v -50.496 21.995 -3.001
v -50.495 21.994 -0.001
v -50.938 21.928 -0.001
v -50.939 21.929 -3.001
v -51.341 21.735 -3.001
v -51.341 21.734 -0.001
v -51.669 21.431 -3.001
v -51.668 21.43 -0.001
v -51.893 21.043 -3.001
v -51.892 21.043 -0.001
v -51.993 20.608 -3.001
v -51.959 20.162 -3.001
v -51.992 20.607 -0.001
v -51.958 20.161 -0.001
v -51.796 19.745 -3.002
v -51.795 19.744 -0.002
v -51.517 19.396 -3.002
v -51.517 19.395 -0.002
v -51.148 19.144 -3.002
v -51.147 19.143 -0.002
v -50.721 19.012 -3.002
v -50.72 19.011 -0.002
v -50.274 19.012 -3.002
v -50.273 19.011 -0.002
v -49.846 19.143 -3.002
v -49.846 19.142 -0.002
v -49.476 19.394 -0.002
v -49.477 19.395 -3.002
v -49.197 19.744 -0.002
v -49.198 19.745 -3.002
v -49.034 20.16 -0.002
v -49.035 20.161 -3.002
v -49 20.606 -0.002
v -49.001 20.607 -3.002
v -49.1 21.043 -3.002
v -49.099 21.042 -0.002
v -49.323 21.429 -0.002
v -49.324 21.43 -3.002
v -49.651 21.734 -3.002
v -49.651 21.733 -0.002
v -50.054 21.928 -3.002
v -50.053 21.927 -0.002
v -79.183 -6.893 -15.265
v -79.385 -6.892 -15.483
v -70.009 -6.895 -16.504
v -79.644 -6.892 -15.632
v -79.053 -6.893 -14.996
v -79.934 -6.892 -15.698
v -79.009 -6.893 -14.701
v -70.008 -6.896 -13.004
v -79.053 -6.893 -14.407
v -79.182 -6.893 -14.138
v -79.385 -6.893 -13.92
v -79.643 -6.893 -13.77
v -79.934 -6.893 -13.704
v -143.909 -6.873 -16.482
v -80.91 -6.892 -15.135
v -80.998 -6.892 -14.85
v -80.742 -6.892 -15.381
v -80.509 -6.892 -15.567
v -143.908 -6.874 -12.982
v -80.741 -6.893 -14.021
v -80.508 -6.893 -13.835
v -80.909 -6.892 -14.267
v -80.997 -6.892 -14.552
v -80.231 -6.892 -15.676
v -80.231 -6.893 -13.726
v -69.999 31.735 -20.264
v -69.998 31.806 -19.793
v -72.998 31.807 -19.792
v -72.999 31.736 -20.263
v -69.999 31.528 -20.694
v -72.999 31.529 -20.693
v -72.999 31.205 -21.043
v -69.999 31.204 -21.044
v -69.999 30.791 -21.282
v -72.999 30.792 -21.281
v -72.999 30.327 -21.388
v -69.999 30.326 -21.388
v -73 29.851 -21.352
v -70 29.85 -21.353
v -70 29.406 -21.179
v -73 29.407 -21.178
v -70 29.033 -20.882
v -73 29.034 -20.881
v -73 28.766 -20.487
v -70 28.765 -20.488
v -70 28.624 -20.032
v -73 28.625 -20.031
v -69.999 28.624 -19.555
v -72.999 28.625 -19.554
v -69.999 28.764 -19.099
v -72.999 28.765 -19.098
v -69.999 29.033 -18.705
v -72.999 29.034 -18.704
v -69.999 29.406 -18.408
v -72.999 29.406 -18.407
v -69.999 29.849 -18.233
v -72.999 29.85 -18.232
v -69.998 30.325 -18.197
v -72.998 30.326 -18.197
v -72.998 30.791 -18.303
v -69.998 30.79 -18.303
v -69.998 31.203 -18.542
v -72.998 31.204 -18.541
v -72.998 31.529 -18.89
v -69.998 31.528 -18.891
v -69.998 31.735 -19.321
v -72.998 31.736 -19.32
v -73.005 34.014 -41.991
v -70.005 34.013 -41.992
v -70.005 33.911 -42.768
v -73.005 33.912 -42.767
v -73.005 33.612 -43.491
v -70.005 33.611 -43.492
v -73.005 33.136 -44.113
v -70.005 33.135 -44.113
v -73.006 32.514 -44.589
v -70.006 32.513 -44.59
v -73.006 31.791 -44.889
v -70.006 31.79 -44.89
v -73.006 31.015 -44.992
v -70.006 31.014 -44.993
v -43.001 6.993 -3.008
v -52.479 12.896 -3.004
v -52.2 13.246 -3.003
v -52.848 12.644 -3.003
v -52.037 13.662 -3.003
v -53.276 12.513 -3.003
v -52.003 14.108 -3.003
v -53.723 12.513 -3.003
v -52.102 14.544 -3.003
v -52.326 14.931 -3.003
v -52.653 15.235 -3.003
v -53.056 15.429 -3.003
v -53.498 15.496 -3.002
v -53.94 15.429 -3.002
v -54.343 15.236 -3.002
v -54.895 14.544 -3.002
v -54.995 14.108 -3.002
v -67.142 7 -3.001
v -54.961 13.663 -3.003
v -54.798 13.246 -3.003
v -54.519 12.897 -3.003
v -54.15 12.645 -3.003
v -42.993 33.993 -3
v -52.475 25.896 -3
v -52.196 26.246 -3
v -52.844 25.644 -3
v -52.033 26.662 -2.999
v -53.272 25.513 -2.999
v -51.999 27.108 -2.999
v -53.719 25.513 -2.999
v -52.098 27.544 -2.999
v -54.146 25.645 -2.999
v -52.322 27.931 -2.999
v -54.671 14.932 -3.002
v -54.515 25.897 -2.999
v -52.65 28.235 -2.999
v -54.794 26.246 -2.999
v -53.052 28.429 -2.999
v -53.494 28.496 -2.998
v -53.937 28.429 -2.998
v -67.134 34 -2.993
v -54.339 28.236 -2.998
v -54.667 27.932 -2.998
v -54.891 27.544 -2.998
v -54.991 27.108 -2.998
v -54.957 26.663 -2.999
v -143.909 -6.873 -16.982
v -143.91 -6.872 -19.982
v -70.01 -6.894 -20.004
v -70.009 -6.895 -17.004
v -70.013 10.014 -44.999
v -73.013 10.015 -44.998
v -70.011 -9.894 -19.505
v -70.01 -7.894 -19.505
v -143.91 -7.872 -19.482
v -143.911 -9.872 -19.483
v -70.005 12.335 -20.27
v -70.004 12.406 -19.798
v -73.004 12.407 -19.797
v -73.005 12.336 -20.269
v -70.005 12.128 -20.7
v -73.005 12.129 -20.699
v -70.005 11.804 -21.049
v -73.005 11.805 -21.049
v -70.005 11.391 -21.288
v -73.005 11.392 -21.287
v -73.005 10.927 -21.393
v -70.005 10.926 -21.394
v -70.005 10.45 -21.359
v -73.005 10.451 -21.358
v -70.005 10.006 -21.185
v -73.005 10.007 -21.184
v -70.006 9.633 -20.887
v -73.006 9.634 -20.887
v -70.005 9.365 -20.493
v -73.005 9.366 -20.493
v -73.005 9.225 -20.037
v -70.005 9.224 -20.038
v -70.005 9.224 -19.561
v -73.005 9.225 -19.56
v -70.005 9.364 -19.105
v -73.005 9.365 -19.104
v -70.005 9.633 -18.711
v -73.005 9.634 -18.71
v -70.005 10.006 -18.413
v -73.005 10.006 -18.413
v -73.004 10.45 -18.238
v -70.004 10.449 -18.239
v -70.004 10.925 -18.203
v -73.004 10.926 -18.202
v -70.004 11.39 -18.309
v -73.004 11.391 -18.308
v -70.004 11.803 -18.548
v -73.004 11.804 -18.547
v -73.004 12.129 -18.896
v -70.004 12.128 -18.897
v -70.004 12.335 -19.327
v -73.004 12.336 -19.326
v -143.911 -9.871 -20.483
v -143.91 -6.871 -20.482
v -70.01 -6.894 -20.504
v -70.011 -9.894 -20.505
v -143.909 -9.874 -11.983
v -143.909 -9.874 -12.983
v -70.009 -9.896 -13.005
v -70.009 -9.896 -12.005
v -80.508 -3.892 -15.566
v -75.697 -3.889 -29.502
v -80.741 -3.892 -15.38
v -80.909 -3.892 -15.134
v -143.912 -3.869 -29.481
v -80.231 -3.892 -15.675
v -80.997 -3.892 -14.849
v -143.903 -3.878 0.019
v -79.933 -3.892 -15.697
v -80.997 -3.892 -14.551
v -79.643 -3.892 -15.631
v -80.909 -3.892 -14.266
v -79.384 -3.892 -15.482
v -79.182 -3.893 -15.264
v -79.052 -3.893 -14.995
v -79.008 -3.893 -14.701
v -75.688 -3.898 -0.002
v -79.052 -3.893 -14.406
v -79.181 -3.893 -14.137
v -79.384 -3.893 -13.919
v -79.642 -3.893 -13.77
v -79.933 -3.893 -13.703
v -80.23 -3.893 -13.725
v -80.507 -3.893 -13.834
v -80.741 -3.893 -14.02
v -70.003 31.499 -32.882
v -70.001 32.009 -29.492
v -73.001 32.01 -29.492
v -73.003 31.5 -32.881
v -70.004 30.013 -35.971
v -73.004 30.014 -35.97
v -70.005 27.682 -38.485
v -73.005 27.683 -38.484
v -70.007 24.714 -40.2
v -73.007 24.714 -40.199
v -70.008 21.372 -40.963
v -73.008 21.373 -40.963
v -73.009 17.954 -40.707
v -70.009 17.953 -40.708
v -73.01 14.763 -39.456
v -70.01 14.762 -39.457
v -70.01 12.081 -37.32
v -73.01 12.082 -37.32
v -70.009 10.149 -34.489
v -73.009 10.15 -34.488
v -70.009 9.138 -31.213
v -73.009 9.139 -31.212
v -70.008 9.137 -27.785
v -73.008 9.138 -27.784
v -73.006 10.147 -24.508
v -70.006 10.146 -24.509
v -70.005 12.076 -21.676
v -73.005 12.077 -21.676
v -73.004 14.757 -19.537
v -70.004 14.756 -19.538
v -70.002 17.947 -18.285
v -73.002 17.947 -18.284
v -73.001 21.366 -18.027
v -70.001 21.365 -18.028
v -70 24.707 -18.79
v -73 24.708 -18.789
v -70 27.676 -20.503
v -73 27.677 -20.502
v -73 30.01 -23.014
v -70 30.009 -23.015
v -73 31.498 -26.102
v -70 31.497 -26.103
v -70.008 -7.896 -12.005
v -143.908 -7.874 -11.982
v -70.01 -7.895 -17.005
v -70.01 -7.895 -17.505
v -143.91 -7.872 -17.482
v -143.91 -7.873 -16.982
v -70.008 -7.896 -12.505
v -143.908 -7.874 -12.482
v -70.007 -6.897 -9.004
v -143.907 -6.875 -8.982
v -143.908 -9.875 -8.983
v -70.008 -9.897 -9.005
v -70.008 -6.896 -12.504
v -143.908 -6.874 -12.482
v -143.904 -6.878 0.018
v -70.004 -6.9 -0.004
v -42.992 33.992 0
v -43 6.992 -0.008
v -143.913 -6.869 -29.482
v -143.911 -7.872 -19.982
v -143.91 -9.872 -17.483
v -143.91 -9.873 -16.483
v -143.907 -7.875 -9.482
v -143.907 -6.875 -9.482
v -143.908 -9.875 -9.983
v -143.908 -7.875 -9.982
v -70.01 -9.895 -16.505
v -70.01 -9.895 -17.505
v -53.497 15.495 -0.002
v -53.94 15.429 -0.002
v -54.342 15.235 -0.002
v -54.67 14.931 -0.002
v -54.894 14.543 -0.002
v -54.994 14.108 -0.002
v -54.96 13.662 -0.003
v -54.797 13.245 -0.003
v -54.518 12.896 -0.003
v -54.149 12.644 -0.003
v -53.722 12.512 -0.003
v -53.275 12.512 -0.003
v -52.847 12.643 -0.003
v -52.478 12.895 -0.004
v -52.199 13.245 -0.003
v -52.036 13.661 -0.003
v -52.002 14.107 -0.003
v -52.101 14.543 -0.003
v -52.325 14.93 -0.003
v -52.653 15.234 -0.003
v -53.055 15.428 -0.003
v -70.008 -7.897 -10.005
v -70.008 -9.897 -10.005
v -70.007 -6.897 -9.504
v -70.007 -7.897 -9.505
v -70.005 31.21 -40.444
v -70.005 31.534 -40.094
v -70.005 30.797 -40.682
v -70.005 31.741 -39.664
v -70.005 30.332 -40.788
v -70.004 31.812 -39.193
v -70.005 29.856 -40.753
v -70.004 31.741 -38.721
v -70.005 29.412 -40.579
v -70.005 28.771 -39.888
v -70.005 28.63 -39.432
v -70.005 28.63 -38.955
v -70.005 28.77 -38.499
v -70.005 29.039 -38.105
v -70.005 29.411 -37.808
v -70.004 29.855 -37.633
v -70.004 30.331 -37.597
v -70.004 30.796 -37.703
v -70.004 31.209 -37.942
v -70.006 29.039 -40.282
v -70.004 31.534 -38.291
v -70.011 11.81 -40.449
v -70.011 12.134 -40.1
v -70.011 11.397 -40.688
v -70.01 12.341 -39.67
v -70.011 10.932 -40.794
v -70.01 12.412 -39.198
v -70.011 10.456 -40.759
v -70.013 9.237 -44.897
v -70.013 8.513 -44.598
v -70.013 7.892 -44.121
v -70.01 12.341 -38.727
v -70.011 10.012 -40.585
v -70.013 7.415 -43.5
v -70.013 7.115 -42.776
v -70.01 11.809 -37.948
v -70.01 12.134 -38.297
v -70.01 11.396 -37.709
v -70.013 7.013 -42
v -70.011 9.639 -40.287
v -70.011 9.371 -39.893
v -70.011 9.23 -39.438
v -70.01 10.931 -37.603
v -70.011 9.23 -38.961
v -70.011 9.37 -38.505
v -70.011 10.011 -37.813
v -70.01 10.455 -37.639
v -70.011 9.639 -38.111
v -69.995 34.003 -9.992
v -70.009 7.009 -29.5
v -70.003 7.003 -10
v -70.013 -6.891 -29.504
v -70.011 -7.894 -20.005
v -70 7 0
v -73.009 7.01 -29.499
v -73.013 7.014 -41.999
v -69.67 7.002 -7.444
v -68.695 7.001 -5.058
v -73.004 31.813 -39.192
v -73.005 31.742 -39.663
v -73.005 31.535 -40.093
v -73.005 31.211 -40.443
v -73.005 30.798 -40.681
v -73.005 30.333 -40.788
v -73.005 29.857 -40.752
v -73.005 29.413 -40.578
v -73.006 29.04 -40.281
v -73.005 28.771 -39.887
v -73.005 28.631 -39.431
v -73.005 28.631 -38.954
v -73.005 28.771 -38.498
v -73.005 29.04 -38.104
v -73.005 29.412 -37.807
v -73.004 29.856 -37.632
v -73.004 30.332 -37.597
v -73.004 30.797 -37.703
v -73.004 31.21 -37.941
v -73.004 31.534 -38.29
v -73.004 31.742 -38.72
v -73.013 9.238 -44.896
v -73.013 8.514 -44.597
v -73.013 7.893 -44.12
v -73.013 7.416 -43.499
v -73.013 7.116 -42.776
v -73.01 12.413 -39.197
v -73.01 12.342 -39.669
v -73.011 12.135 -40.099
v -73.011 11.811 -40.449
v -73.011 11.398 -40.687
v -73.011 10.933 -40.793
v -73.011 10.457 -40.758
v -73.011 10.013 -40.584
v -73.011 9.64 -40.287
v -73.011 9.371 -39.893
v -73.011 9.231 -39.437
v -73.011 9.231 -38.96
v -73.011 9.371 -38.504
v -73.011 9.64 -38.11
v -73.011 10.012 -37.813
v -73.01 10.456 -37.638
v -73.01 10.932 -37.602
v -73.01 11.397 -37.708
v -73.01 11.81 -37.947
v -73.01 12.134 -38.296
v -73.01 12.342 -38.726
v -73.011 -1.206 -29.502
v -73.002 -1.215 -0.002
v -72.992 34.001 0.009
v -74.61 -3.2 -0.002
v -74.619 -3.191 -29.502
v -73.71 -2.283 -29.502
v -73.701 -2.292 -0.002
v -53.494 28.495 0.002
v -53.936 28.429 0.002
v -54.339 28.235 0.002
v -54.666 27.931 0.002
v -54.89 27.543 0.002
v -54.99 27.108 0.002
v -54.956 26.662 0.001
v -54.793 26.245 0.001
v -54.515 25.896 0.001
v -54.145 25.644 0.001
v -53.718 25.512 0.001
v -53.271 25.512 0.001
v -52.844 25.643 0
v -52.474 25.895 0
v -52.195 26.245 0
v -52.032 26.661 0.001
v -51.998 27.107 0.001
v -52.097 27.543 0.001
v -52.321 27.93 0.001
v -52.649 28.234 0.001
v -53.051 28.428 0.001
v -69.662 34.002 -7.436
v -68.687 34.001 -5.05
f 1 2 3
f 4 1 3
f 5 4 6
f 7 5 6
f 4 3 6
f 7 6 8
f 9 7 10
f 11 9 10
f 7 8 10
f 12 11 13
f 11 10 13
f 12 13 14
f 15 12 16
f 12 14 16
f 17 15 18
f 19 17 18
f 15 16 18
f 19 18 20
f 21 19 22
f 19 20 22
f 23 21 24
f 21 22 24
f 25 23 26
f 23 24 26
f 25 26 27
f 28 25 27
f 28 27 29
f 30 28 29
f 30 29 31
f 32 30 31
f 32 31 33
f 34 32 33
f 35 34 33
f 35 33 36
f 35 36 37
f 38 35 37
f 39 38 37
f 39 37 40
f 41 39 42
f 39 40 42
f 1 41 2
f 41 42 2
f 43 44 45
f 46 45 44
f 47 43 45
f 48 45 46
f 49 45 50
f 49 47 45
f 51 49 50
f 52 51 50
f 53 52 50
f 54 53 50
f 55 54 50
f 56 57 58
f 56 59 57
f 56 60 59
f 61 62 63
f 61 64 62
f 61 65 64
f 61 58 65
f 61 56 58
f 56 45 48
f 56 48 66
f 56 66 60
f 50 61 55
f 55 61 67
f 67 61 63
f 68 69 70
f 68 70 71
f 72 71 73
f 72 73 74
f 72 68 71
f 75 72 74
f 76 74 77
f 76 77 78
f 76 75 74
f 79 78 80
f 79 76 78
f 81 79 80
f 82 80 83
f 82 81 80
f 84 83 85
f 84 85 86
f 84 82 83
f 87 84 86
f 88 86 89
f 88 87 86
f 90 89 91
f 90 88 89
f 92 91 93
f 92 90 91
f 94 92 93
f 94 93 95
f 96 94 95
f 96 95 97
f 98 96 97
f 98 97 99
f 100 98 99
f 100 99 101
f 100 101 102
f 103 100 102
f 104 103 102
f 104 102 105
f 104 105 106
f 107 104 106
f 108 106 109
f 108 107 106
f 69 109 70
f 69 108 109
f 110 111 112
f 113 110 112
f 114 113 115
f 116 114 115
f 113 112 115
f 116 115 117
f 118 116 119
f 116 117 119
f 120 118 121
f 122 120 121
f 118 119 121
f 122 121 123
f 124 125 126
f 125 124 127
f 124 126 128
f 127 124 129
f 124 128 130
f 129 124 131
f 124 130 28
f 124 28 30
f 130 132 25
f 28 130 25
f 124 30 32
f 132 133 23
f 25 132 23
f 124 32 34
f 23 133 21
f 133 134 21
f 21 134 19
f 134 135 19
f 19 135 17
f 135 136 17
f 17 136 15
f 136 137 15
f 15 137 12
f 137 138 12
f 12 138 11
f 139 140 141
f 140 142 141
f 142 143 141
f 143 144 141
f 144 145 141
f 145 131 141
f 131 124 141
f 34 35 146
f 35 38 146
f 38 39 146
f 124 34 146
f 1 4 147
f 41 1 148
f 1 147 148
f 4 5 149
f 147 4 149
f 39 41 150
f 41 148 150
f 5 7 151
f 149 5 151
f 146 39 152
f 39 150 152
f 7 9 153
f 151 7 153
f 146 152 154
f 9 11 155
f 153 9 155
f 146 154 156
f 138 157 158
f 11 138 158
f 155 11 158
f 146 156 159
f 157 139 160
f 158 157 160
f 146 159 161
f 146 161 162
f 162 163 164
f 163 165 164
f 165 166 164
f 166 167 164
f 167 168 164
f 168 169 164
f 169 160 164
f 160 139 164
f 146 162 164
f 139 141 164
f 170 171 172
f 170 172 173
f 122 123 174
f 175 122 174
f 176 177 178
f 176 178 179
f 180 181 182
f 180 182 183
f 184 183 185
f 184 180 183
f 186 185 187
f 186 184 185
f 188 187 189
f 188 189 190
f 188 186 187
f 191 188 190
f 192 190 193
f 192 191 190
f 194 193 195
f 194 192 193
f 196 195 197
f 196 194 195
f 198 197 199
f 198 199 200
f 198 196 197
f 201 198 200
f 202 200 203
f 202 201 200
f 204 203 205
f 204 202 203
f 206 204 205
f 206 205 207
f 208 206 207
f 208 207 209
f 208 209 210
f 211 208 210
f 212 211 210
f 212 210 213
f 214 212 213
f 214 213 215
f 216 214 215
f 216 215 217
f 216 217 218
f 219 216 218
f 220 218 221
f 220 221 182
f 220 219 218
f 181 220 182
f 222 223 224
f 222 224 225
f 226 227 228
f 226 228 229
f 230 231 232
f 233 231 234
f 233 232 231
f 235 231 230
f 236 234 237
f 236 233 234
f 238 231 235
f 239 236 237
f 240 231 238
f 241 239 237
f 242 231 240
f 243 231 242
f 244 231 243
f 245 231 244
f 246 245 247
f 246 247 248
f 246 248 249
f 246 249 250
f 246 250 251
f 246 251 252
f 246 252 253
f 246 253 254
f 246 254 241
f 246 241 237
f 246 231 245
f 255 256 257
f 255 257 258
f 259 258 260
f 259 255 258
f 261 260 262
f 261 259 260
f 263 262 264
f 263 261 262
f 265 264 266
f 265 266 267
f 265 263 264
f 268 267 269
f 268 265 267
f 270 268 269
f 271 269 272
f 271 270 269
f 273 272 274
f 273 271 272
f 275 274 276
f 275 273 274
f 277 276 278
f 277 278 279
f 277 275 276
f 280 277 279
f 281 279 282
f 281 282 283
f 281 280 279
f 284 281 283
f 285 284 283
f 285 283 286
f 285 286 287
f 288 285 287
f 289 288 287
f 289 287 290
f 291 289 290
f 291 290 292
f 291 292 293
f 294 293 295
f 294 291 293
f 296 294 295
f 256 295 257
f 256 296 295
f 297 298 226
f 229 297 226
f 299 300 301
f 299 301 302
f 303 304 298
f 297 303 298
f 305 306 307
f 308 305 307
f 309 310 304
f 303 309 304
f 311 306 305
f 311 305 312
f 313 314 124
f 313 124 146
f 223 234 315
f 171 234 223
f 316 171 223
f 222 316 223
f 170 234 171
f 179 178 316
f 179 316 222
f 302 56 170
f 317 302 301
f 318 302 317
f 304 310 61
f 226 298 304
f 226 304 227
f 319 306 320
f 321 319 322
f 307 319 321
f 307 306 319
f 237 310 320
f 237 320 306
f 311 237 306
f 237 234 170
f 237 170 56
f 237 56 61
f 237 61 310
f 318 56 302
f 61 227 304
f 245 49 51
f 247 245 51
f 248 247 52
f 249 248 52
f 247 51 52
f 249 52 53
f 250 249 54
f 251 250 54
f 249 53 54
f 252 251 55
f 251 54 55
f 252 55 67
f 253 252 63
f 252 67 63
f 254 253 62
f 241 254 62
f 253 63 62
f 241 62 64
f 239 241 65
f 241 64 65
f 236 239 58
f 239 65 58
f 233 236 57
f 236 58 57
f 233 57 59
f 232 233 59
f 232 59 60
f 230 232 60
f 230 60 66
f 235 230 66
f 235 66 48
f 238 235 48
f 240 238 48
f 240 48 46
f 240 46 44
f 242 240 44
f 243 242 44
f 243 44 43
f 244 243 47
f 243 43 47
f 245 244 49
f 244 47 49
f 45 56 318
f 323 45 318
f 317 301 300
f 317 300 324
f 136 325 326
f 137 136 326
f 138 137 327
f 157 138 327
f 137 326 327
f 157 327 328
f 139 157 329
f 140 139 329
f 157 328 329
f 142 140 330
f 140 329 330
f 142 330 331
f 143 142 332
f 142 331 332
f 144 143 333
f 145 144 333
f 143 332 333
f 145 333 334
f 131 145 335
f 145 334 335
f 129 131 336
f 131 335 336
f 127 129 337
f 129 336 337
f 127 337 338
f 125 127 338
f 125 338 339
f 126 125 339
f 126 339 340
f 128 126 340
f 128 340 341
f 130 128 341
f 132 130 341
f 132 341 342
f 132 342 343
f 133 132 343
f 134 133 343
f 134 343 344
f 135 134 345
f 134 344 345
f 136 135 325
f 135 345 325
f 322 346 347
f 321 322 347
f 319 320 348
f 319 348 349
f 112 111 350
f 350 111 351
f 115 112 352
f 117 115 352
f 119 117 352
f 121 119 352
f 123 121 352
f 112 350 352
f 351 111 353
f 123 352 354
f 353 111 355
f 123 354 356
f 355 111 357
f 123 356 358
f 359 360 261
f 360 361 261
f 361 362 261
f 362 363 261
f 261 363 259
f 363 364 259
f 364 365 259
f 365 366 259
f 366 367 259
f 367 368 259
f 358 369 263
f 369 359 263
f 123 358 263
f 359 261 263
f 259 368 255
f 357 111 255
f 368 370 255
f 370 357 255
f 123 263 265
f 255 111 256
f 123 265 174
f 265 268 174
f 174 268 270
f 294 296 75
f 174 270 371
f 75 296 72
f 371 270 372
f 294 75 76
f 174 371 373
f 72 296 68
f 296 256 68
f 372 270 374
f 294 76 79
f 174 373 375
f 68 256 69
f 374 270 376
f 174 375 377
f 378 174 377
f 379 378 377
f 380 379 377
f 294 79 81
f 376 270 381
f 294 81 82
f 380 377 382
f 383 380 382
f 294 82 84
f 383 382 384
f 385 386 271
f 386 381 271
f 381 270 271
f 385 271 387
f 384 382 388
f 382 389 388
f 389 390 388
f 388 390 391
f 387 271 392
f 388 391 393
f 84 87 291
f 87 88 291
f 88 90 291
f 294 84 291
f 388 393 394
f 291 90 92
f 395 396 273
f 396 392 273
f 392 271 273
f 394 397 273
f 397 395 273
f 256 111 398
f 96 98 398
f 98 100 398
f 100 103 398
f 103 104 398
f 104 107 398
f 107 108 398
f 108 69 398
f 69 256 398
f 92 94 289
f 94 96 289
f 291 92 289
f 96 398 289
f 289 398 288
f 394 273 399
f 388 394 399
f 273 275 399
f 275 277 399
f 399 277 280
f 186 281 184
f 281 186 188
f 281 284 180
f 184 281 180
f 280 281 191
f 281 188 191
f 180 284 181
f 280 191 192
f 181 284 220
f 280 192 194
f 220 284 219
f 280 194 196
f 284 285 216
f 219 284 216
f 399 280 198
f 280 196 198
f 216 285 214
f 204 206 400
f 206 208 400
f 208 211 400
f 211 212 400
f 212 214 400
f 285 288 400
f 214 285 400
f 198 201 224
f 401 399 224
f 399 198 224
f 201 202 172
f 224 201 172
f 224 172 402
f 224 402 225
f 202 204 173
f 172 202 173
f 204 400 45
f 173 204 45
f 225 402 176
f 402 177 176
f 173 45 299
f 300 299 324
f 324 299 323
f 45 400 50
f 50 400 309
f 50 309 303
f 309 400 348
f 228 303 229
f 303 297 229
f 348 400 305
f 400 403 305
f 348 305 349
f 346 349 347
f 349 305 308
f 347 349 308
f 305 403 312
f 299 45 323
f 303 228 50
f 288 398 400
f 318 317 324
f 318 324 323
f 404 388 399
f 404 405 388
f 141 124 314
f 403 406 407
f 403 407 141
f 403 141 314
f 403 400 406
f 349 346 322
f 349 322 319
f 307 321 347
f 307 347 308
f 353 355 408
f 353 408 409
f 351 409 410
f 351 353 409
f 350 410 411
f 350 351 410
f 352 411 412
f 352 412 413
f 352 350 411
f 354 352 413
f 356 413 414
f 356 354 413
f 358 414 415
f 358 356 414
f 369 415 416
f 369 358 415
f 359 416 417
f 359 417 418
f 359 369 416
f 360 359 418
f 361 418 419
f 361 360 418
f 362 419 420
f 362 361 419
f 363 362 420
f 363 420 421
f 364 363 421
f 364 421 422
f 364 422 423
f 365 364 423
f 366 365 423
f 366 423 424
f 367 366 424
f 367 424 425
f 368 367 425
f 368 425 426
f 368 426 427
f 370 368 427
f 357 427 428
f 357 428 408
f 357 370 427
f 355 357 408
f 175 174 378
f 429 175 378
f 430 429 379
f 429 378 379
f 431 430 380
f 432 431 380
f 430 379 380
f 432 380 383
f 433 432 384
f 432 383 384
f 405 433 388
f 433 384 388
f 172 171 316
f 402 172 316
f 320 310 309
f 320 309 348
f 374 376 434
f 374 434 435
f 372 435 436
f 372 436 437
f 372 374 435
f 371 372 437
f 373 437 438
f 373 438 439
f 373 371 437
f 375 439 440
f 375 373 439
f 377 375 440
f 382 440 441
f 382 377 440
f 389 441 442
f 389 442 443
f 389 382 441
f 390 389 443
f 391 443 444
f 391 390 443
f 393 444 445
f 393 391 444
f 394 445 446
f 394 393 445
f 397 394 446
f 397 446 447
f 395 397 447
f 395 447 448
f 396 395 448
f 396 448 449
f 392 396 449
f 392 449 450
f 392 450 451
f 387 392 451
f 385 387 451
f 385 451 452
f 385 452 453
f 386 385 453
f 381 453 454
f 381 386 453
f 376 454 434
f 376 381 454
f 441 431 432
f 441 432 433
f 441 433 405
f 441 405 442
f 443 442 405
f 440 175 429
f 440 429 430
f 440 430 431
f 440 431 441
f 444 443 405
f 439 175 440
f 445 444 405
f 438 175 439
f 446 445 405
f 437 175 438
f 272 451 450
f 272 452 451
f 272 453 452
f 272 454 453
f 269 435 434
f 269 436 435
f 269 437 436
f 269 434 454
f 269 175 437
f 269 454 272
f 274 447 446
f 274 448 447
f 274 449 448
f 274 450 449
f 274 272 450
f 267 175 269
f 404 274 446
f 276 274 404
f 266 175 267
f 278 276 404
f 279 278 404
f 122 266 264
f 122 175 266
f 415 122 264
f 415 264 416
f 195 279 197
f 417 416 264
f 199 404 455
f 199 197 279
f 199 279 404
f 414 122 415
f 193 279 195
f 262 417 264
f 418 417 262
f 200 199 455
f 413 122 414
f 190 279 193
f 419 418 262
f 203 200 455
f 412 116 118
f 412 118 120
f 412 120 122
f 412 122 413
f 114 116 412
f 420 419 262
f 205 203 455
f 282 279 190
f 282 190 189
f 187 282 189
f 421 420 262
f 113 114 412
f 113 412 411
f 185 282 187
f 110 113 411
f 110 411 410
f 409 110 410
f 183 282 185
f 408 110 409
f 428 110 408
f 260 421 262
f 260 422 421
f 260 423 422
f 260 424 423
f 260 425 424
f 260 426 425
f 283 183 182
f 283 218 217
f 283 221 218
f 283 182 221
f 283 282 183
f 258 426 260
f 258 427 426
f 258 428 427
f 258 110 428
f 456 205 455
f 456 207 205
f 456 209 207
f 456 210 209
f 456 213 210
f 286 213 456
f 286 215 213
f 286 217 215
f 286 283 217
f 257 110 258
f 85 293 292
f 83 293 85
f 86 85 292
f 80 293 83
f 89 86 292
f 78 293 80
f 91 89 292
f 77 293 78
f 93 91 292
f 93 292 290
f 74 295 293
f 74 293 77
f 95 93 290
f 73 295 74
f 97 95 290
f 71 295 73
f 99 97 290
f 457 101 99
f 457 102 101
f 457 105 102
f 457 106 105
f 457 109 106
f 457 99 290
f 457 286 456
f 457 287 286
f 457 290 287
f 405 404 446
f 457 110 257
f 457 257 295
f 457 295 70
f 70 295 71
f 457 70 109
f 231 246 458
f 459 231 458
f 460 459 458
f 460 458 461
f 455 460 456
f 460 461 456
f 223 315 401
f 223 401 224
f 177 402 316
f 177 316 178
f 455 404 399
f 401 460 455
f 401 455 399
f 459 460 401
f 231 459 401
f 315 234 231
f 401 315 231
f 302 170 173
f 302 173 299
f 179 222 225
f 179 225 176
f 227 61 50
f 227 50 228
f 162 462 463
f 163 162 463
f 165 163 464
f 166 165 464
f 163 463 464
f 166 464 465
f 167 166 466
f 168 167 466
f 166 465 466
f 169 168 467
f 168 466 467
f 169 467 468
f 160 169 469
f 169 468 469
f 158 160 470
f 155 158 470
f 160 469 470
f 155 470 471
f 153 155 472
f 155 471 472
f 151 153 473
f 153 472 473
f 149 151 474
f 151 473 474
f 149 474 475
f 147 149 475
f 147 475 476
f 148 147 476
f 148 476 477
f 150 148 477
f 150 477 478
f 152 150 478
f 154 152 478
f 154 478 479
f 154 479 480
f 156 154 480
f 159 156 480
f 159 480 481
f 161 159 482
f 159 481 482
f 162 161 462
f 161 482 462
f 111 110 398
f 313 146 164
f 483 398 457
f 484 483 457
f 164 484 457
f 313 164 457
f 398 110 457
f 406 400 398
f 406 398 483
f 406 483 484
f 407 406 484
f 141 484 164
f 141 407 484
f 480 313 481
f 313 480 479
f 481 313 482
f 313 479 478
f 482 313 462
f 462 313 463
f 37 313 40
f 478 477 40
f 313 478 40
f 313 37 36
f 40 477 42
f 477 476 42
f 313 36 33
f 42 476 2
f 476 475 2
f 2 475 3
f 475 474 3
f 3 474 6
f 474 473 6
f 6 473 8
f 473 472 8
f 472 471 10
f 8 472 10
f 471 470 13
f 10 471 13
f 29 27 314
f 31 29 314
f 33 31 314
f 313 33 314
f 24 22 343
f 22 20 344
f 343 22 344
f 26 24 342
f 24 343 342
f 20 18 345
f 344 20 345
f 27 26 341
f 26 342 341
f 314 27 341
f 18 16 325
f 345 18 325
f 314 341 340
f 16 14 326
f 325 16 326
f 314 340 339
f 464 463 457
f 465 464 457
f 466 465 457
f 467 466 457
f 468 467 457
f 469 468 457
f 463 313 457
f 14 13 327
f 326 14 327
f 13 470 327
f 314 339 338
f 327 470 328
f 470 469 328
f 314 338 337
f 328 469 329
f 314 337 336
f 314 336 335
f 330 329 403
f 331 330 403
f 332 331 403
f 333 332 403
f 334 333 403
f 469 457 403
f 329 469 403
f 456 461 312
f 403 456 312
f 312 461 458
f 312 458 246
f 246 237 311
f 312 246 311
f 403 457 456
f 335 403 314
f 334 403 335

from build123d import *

# Parameters (mm, degrees)
SKETCH089_W             = 27
SKETCH089_H             = 27
SKETCH089_R             = 1.5
PAD036_DEPTH            = 3
SKETCH088_R             = 11.5
SKETCH088_R_2           = 1.6
PAD037_DEPTH            = 3
PAD038_DEPTH            = 27
SKETCH092_W             = 3
SKETCH092_H             = 29.5
PAD039_DEPTH            = 10.9
SKETCH093_W             = 3
SKETCH093_H             = 29.5
PAD040_DEPTH            = 70.9
PAD040_DEPTH_BACK       = 3
SKETCH094_W             = 3
SKETCH094_H             = 4
PAD041_DEPTH            = 73.9
SKETCH095_W             = 1
SKETCH095_H             = 3
SKETCH095_W_2           = 2
SKETCH095_H_2           = 2
POCKET048_DEPTH         = 74
SKETCH096_R             = 1
POCKET049_DEPTH         = 3
PAD042_DEPTH            = 29.5
BODY010_ROLL_ANGLE      = -89.9826768737
BODY010_PITCH_ANGLE     = -0.0173178896
BODY010_PLACEMENT_ANGLE = 89.9826768737


with BuildPart() as part:
    # Sketch089 → Pad036 (new body)
    with BuildSketch(Plane.XZ):
        with Locations((13.5, -13.5)):
            Rectangle(SKETCH089_W, SKETCH089_H)
        with Locations((7, -16.5)):
            Circle(SKETCH089_R, mode=Mode.SUBTRACT)
        with Locations((13.5, -19.5)):
            Circle(SKETCH089_R, mode=Mode.SUBTRACT)
        with Locations((20, -16.5)):
            Circle(SKETCH089_R, mode=Mode.SUBTRACT)
    extrude(amount=-PAD036_DEPTH)

    # Sketch088 → Pad037 (join)
    with BuildSketch(Plane.XY):
        with BuildLine():
            Line((0, 42), (0, 0))
            Line((0, 0), (27, 0))
            Line((27, 0), (27, 42))
            ThreePointArc((27, 42), (26.1213203436, 44.1213203436), (24, 45))
            Line((24, 45), (3, 45))
            ThreePointArc((3, 45), (0.8786796564, 44.1213203436), (0, 42))
        make_face()
        with Locations((13.5, 29.5)):
            Circle(SKETCH088_R, mode=Mode.SUBTRACT)
        with Locations((3.8, 39.2)):
            Circle(SKETCH088_R_2, mode=Mode.SUBTRACT)
        with Locations((23.2, 39.2)):
            Circle(SKETCH088_R_2, mode=Mode.SUBTRACT)
        with Locations((23.2, 19.8)):
            Circle(SKETCH088_R_2, mode=Mode.SUBTRACT)
        with Locations((3.8, 19.8)):
            Circle(SKETCH088_R_2, mode=Mode.SUBTRACT)
    extrude(amount=PAD037_DEPTH)

    # Sketch090 → Pad038 (join)
    with BuildSketch(Plane.YZ):
        with BuildLine():
            ThreePointArc((10, 0), (2.9289309634, -2.9289334129), (0, -10.0000034641))
            Line((0, -10.000003), (0, 0))
            Line((10, 0), (0, 0))
        make_face()
    extrude(amount=PAD038_DEPTH)

    # Sketch092 (on Face17 of Pad038) → Pad039 (join)
    with BuildSketch(Plane(origin=(0, 0, 0), x_dir=(0, 0, -1), z_dir=(-1, 0, 0))):
        with Locations((-1.5, -14.75)):
            Rectangle(SKETCH092_W, SKETCH092_H)
    extrude(amount=PAD039_DEPTH)

    # Sketch093 (on Face21 of Pad039) → Pad040 (join, two sides)
    with BuildSketch(Plane(origin=(0, 0, 3), x_dir=(-1, 0, 0), z_dir=(0, 0, 1))) as pad040_sk:
        with Locations((12.4, -14.75)):
            Rectangle(SKETCH093_W, SKETCH093_H)
    extrude(amount=PAD040_DEPTH)
    extrude(pad040_sk.sketch, amount=-PAD040_DEPTH_BACK)

    # Sketch094 (on Face20 of Pad040) → Pad041 (join)
    with BuildSketch(Plane(origin=(0, 0, 73.9), x_dir=(-1, 0, 0), z_dir=(0, 0, 1))):
        with Locations((15.4, -11)):
            Rectangle(SKETCH094_W, SKETCH094_H)
        with Locations((15.4, -18.5)):
            Rectangle(SKETCH094_W, SKETCH094_H)
    extrude(amount=-PAD041_DEPTH)

    # Sketch095 (on Face32 of Pad041) → Pocket048 (cut)
    with BuildSketch(Plane(origin=(0, 0, 73.9), x_dir=(-1, 0, 0), z_dir=(0, 0, 1))):
        with Locations((14.4, -11)):
            Rectangle(SKETCH095_W, SKETCH095_H)
        with Locations((15.9, -11)):
            Rectangle(SKETCH095_W_2, SKETCH095_H_2)
        with Locations((14.4, -18.5)):
            Rectangle(SKETCH095_W, SKETCH095_H)
        with Locations((15.9, -18.5)):
            Rectangle(SKETCH095_W_2, SKETCH095_H_2)
    extrude(amount=-POCKET048_DEPTH, mode=Mode.SUBTRACT)

    # Sketch096 (on Face20 of Pocket048) → Pocket049 (cut)
    with BuildSketch(Plane(origin=(-13.9, 0, 0), x_dir=(0, 0, -1), z_dir=(-1, 0, 0))):
        with Locations((-10, -14.7)):
            Circle(SKETCH096_R)
    extrude(amount=-POCKET049_DEPTH, mode=Mode.SUBTRACT)

    # Sketch097 (on Face33 of Pocket049) → Pad042 (join)
    with BuildSketch(Plane.XZ):
        with BuildLine():
            ThreePointArc((-11.1945579857, 6.3643060843), (-9.8282285955, 4.1860605156), (-7.686876766, 2.76260623))
            Line((-7.686877, 2.762606), (-11.55202, 1.663341))
            Line((-11.194558, 6.364306), (-11.55202, 1.663341))
        make_face()
    extrude(amount=-PAD042_DEPTH)


with BuildPart() as part_1:
    # Body010 roll: moved
    add(part.part.rotate(Axis((0, 0, 0), (1, 0, 0)), BODY010_ROLL_ANGLE))


with BuildPart() as part_2:
    # Body010 pitch: moved
    add(part_1.part.rotate(Axis((0, 0, 0), (0, 1, 0)), BODY010_PITCH_ANGLE))


with BuildPart() as part_3:
    # Body010 placement: moved
    add(part_2.part.moved(Location((-70, 7, 0))).rotate(Axis((-70, 7, 0), (0, 0, 1)), BODY010_PLACEMENT_ANGLE))


solid = part_3.part
